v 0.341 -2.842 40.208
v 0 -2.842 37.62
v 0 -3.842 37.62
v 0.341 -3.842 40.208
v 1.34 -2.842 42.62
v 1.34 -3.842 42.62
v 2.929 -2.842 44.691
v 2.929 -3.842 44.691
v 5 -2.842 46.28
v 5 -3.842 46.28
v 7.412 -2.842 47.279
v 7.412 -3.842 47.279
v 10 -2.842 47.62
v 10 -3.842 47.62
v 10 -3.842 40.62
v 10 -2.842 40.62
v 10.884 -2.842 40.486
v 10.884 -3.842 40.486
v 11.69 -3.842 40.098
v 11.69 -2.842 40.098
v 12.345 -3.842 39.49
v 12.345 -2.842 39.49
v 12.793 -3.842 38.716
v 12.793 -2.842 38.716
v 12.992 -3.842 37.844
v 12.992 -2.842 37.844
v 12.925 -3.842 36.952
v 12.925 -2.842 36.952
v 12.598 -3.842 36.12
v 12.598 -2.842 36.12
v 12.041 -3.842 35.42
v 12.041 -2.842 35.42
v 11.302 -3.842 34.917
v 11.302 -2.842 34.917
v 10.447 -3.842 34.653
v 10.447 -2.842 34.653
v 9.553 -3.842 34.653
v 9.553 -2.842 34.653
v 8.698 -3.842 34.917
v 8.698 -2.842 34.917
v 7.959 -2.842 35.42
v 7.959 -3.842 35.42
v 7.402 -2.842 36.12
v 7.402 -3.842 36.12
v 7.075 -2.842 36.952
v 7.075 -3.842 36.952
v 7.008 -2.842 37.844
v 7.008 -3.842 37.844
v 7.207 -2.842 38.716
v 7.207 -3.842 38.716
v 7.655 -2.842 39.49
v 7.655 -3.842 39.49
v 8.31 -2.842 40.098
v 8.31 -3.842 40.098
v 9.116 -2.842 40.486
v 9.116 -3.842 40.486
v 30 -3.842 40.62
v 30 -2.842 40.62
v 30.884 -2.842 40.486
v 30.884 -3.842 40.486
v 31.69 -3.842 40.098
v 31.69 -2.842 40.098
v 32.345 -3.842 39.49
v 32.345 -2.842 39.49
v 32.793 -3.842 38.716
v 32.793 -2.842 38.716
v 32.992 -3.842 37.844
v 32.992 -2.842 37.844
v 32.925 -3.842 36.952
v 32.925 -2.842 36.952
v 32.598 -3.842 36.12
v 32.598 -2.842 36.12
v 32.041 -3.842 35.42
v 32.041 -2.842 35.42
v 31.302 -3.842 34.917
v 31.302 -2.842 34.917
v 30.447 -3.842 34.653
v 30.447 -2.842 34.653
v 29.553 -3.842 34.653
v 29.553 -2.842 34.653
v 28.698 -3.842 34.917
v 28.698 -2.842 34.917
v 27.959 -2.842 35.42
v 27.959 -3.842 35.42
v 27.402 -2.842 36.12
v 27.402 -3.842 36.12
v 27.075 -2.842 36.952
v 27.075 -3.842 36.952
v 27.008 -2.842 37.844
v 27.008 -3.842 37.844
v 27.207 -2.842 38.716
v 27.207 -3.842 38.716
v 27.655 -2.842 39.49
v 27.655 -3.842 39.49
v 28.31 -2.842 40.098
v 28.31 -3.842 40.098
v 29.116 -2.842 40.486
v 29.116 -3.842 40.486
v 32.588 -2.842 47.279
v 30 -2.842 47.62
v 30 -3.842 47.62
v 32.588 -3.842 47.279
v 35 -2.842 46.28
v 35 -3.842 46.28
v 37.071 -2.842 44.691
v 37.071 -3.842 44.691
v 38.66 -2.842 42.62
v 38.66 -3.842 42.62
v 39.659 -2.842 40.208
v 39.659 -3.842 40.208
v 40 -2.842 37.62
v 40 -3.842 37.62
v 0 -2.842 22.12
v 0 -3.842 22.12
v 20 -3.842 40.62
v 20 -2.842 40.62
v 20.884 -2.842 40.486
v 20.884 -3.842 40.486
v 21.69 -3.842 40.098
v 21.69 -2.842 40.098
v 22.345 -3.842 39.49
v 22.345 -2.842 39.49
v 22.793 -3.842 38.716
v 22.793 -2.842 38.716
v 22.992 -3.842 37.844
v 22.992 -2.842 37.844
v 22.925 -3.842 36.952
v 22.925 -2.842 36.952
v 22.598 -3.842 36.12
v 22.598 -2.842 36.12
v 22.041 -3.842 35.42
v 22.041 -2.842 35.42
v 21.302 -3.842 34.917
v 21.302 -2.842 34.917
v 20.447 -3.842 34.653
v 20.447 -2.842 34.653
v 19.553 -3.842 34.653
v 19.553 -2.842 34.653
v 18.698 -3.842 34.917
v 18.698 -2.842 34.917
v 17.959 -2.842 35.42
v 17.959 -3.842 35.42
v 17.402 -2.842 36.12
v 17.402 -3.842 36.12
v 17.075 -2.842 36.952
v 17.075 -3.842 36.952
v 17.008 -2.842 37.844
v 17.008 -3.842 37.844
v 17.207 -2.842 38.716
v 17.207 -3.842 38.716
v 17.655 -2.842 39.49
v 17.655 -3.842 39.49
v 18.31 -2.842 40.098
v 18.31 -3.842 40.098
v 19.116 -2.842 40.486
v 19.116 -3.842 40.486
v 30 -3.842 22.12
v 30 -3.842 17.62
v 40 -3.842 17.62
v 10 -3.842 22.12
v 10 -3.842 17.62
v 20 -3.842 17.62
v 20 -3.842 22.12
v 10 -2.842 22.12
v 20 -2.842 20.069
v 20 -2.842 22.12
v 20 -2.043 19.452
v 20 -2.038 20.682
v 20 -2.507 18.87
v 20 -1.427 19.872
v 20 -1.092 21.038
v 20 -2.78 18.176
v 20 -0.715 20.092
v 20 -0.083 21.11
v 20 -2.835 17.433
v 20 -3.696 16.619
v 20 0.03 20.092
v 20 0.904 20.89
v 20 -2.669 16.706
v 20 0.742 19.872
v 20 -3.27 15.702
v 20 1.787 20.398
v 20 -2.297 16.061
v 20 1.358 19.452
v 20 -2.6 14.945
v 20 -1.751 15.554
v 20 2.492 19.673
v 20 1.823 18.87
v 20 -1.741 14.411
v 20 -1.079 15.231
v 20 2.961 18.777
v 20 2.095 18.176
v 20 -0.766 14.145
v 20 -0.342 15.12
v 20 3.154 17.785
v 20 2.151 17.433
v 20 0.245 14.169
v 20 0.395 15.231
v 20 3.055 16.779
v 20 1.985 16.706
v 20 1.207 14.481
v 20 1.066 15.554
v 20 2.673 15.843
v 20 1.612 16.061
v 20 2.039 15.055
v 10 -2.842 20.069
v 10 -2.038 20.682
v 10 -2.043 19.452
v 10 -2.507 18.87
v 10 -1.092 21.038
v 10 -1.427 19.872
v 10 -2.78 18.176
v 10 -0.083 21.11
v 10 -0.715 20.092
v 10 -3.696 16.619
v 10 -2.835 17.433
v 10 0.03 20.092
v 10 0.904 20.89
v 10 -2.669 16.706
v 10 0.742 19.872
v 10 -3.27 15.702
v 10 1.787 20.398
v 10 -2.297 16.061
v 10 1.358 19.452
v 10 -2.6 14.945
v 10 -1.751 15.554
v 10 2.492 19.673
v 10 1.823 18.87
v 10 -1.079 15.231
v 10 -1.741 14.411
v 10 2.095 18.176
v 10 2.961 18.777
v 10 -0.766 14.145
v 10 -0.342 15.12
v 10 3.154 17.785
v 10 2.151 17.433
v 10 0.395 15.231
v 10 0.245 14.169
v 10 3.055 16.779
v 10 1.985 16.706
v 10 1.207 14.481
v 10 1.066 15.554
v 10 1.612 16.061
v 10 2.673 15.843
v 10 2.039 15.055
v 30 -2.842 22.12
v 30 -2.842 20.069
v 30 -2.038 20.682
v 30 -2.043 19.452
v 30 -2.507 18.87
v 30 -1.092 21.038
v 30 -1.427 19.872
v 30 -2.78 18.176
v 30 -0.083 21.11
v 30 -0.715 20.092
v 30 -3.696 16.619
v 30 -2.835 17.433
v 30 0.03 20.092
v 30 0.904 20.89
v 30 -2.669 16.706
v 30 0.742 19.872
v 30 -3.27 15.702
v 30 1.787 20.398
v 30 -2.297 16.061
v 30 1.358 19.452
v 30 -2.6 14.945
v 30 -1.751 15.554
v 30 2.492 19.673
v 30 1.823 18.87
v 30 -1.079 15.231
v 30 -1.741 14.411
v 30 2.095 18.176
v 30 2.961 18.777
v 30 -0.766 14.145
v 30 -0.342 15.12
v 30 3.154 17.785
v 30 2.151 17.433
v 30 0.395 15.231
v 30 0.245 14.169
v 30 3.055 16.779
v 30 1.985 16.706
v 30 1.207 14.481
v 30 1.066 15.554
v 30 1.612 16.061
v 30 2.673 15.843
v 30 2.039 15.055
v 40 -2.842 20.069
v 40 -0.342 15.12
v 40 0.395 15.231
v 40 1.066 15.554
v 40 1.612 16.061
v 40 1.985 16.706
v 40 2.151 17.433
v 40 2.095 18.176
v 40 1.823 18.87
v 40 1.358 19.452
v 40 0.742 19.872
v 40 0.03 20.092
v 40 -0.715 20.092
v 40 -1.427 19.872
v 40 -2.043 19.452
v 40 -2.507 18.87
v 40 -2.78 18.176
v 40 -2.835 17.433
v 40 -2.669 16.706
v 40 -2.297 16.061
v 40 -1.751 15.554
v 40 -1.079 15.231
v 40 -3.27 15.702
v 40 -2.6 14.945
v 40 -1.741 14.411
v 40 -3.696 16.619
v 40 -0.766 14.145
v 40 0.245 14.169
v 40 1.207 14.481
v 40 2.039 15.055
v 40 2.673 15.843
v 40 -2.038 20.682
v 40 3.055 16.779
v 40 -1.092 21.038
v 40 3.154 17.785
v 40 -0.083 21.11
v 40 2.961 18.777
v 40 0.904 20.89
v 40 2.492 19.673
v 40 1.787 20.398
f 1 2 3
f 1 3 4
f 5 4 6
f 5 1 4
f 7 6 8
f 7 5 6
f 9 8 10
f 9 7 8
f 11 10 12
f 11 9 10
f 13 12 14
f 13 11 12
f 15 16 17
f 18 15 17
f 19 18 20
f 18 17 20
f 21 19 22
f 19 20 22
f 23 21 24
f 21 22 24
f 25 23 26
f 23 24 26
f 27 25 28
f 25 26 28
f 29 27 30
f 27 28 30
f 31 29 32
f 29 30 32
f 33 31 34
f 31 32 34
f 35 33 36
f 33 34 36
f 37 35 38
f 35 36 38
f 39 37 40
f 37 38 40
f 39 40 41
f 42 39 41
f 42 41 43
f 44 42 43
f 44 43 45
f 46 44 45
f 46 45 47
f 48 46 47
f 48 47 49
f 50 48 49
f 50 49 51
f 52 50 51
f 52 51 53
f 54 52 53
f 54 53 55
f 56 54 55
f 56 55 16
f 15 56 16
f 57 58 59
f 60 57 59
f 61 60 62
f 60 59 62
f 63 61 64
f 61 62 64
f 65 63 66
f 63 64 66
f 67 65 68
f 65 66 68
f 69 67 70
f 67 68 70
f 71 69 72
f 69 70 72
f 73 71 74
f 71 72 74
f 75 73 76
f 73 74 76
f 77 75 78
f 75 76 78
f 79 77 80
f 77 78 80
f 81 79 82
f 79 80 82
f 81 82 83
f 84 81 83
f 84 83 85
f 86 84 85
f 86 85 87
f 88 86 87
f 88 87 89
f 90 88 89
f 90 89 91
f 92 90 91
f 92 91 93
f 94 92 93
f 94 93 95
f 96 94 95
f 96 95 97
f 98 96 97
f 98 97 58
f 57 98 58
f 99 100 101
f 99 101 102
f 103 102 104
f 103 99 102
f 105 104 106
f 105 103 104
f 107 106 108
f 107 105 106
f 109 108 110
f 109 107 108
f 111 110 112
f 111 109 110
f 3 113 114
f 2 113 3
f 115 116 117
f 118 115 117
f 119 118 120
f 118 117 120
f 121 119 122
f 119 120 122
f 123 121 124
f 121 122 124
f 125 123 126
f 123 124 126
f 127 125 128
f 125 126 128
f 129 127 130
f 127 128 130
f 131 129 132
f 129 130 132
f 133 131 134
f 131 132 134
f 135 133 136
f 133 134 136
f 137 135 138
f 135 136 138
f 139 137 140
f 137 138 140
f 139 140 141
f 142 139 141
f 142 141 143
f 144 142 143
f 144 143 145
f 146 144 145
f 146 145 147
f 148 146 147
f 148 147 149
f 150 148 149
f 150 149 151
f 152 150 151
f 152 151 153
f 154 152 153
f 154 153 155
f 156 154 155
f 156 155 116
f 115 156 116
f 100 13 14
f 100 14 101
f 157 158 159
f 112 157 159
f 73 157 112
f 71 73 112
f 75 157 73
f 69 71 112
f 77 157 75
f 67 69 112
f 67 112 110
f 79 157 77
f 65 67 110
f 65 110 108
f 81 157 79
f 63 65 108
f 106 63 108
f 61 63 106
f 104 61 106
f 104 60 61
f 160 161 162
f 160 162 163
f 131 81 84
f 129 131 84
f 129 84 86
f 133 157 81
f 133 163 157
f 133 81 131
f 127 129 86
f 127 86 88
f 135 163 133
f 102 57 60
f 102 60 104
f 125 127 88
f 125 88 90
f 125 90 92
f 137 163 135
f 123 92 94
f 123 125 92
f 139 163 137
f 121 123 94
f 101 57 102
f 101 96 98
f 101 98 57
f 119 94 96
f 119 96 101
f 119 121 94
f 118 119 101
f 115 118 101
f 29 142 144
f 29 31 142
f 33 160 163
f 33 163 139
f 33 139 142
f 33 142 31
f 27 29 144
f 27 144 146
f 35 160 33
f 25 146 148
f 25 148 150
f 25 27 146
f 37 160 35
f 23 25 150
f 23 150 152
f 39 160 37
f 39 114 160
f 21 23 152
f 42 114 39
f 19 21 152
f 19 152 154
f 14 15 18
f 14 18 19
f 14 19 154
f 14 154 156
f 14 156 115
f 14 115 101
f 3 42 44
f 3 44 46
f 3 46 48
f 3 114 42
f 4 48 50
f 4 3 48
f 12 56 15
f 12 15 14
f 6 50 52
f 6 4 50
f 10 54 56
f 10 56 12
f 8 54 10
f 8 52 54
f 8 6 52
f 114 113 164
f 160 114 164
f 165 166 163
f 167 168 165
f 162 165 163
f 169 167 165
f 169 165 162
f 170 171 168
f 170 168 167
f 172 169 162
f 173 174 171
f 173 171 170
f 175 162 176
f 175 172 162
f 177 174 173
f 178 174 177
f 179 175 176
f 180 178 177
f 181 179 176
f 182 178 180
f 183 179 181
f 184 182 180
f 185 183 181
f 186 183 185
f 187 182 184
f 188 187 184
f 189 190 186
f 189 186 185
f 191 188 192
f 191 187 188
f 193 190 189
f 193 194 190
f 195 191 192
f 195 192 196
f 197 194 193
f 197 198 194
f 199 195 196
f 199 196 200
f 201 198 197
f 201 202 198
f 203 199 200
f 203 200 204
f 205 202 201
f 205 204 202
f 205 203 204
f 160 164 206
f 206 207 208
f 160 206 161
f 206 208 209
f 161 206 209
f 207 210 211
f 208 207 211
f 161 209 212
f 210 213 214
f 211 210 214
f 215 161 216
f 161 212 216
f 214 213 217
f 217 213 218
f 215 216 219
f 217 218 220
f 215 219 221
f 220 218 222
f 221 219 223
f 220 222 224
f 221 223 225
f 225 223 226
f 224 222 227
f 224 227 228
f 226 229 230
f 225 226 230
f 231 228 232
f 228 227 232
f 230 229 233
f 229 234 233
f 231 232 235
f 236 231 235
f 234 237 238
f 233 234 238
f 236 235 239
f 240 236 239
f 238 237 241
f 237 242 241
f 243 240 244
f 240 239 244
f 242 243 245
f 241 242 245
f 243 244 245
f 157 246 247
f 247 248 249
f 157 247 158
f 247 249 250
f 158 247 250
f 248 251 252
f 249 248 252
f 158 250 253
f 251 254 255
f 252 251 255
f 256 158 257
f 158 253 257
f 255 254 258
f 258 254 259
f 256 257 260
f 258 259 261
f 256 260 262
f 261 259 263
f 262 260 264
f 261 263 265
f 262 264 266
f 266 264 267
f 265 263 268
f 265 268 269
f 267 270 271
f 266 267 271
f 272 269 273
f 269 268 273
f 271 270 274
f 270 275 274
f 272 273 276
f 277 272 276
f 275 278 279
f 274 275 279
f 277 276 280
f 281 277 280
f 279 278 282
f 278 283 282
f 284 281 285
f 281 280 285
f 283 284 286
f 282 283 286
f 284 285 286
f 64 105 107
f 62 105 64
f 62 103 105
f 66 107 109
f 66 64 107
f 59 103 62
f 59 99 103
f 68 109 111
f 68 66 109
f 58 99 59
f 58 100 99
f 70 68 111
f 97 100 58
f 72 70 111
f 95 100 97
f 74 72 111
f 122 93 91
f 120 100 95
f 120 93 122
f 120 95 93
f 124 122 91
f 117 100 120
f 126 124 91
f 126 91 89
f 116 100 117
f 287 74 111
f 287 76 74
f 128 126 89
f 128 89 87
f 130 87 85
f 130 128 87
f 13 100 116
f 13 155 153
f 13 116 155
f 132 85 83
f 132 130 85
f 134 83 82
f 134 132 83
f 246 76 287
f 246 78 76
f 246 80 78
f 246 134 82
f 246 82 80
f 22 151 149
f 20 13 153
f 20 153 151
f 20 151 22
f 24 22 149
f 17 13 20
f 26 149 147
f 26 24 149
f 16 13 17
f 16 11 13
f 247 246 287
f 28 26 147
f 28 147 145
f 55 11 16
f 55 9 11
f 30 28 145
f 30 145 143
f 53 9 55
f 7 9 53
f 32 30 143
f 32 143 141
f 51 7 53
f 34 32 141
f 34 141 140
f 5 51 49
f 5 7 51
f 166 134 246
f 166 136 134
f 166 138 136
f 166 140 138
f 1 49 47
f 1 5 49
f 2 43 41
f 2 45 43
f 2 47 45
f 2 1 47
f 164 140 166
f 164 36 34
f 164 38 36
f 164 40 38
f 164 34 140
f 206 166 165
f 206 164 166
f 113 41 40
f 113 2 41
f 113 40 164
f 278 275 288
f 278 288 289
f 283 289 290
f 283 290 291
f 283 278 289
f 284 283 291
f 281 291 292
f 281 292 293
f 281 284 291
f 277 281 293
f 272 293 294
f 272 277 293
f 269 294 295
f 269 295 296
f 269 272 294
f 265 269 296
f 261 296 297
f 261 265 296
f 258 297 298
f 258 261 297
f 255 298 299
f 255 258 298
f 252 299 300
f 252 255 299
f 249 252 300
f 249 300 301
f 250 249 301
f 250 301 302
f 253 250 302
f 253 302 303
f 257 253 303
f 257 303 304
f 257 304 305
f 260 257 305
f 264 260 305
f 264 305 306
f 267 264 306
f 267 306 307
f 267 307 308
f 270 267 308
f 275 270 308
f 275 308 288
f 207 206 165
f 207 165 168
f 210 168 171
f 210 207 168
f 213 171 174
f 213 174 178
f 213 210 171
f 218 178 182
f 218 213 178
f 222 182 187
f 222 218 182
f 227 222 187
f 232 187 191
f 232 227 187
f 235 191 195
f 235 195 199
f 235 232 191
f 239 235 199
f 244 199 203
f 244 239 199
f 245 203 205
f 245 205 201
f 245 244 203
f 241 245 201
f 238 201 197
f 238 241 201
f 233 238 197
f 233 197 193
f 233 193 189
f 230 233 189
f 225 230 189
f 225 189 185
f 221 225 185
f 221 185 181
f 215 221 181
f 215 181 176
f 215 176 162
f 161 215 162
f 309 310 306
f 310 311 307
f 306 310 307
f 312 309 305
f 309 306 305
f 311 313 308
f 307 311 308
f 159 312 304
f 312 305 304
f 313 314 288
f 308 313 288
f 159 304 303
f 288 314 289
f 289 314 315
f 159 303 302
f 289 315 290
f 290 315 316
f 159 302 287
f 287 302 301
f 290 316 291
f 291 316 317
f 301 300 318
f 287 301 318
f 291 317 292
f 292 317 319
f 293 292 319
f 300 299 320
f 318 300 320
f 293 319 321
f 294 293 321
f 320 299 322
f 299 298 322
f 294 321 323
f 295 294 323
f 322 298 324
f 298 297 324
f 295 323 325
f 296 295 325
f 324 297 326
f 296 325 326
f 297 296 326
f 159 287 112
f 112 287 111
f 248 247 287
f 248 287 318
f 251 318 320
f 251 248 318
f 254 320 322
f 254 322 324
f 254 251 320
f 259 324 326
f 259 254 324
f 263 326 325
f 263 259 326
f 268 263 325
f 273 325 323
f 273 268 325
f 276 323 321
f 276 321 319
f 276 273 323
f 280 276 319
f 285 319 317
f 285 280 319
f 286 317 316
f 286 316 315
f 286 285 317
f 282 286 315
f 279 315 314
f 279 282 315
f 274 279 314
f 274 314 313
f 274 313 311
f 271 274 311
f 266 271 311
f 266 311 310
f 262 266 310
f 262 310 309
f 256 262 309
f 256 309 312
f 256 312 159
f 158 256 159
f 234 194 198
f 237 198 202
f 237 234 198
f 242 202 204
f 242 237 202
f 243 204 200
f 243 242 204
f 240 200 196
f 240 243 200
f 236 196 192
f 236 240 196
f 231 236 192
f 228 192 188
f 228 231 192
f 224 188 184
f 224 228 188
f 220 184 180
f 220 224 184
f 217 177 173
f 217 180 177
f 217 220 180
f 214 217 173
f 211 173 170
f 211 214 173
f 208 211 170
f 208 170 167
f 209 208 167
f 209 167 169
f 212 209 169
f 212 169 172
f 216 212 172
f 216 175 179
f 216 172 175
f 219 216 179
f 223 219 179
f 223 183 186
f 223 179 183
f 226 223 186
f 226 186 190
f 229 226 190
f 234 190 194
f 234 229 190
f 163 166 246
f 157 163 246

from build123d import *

# Parameters (mm, degrees)
ESQUISSE1_R             = 2.5
BOSS_EXTRU_1_DEPTH      = 40
ESQUISSE2_W             = 10
ESQUISSE2_H             = 7
ENL_V_MAT_EXTRU_1_DEPTH = 44.5
ESQUISSE3_W             = 10
ESQUISSE3_H             = 8
ENL_V_MAT_EXTRU_2_DEPTH = 40
ESQUISSE4_R             = 3
ENL_V_MAT_EXTRU_3_DEPTH = 2


with BuildPart() as part:
    # Esquisse1 → Boss.-Extru.1 (new body)
    with BuildSketch(Plane(origin=(0, 0, 0), x_dir=(0, 0, -1), z_dir=(1, 0, 0))):
        with BuildLine():
            Line((-57.619622055, -2.842276543), (-20.069111797, -2.842276543))
            ThreePointArc((-20.069111797, -2.842276543), (-16.296746399, 2.898093806), (-17.619622055, -3.842276543))
            Line((-17.619622055, -3.842276543), (-57.619622055, -3.842276543))
            Line((-57.619622055, -3.842276543), (-57.619622055, -2.842276543))
        make_face()
        with Locations((-17.619622055, -0.342276543)):
            Circle(ESQUISSE1_R, mode=Mode.SUBTRACT)
    extrude(amount=BOSS_EXTRU_1_DEPTH)

    # Esquisse2 → Enlèv. mat.-Extru.1 (cut, through all)
    with BuildSketch(Plane.XY.offset(57.619622055)):
        with Locations((25, 0.657723457)):
            Rectangle(ESQUISSE2_W, ESQUISSE2_H)
        with Locations((5, 0.657723457)):
            Rectangle(ESQUISSE2_W, ESQUISSE2_H)
    extrude(amount=-ENL_V_MAT_EXTRU_1_DEPTH, mode=Mode.SUBTRACT)

    # Esquisse3 → Enlèv. mat.-Extru.2 (cut)
    with BuildSketch(Plane(origin=(0, -2.842276543, 0), x_dir=(1, 0, 0), z_dir=(0, 1, 0))):
        with Locations((5, -18.119622055)):
            Rectangle(ESQUISSE3_W, ESQUISSE3_H)
        with Locations((25, -18.119622055)):
            Rectangle(ESQUISSE3_W, ESQUISSE3_H)
    extrude(amount=-ENL_V_MAT_EXTRU_2_DEPTH, mode=Mode.SUBTRACT)

    # Esquisse4 → Enlèv. mat.-Extru.3 (cut, through all)
    with BuildSketch(Plane(origin=(0, -2.842276543, 0), x_dir=(1, 0, 0), z_dir=(0, 1, 0))):
        with Locations(Location((10, -37.619622055, 0), (0, 0, 270))):  # turned: the seam where the file's is
            Circle(ESQUISSE4_R)
        with Locations(Location((20, -37.619622055, 0), (0, 0, 270))):  # turned: the seam where the file's is
            Circle(ESQUISSE4_R)
        with Locations(Location((30, -37.619622055, 0), (0, 0, 270))):  # turned: the seam where the file's is
            Circle(ESQUISSE4_R)
        with BuildLine():
            Line((10, -47.619622055), (30, -47.619622055))
            ThreePointArc((30, -47.619622055), (37.071067812, -44.690689866), (40, -37.619622055))
            Line((40, -37.619622055), (40, -57.619622055))
            Line((40, -57.619622055), (0, -57.619622055))
            Line((0, -57.619622055), (0, -37.619622055))
            ThreePointArc((0, -37.619622055), (2.928932188, -44.690689866), (10, -47.619622055))
        make_face()
    extrude(amount=-ENL_V_MAT_EXTRU_3_DEPTH, mode=Mode.SUBTRACT)


solid = part.part
